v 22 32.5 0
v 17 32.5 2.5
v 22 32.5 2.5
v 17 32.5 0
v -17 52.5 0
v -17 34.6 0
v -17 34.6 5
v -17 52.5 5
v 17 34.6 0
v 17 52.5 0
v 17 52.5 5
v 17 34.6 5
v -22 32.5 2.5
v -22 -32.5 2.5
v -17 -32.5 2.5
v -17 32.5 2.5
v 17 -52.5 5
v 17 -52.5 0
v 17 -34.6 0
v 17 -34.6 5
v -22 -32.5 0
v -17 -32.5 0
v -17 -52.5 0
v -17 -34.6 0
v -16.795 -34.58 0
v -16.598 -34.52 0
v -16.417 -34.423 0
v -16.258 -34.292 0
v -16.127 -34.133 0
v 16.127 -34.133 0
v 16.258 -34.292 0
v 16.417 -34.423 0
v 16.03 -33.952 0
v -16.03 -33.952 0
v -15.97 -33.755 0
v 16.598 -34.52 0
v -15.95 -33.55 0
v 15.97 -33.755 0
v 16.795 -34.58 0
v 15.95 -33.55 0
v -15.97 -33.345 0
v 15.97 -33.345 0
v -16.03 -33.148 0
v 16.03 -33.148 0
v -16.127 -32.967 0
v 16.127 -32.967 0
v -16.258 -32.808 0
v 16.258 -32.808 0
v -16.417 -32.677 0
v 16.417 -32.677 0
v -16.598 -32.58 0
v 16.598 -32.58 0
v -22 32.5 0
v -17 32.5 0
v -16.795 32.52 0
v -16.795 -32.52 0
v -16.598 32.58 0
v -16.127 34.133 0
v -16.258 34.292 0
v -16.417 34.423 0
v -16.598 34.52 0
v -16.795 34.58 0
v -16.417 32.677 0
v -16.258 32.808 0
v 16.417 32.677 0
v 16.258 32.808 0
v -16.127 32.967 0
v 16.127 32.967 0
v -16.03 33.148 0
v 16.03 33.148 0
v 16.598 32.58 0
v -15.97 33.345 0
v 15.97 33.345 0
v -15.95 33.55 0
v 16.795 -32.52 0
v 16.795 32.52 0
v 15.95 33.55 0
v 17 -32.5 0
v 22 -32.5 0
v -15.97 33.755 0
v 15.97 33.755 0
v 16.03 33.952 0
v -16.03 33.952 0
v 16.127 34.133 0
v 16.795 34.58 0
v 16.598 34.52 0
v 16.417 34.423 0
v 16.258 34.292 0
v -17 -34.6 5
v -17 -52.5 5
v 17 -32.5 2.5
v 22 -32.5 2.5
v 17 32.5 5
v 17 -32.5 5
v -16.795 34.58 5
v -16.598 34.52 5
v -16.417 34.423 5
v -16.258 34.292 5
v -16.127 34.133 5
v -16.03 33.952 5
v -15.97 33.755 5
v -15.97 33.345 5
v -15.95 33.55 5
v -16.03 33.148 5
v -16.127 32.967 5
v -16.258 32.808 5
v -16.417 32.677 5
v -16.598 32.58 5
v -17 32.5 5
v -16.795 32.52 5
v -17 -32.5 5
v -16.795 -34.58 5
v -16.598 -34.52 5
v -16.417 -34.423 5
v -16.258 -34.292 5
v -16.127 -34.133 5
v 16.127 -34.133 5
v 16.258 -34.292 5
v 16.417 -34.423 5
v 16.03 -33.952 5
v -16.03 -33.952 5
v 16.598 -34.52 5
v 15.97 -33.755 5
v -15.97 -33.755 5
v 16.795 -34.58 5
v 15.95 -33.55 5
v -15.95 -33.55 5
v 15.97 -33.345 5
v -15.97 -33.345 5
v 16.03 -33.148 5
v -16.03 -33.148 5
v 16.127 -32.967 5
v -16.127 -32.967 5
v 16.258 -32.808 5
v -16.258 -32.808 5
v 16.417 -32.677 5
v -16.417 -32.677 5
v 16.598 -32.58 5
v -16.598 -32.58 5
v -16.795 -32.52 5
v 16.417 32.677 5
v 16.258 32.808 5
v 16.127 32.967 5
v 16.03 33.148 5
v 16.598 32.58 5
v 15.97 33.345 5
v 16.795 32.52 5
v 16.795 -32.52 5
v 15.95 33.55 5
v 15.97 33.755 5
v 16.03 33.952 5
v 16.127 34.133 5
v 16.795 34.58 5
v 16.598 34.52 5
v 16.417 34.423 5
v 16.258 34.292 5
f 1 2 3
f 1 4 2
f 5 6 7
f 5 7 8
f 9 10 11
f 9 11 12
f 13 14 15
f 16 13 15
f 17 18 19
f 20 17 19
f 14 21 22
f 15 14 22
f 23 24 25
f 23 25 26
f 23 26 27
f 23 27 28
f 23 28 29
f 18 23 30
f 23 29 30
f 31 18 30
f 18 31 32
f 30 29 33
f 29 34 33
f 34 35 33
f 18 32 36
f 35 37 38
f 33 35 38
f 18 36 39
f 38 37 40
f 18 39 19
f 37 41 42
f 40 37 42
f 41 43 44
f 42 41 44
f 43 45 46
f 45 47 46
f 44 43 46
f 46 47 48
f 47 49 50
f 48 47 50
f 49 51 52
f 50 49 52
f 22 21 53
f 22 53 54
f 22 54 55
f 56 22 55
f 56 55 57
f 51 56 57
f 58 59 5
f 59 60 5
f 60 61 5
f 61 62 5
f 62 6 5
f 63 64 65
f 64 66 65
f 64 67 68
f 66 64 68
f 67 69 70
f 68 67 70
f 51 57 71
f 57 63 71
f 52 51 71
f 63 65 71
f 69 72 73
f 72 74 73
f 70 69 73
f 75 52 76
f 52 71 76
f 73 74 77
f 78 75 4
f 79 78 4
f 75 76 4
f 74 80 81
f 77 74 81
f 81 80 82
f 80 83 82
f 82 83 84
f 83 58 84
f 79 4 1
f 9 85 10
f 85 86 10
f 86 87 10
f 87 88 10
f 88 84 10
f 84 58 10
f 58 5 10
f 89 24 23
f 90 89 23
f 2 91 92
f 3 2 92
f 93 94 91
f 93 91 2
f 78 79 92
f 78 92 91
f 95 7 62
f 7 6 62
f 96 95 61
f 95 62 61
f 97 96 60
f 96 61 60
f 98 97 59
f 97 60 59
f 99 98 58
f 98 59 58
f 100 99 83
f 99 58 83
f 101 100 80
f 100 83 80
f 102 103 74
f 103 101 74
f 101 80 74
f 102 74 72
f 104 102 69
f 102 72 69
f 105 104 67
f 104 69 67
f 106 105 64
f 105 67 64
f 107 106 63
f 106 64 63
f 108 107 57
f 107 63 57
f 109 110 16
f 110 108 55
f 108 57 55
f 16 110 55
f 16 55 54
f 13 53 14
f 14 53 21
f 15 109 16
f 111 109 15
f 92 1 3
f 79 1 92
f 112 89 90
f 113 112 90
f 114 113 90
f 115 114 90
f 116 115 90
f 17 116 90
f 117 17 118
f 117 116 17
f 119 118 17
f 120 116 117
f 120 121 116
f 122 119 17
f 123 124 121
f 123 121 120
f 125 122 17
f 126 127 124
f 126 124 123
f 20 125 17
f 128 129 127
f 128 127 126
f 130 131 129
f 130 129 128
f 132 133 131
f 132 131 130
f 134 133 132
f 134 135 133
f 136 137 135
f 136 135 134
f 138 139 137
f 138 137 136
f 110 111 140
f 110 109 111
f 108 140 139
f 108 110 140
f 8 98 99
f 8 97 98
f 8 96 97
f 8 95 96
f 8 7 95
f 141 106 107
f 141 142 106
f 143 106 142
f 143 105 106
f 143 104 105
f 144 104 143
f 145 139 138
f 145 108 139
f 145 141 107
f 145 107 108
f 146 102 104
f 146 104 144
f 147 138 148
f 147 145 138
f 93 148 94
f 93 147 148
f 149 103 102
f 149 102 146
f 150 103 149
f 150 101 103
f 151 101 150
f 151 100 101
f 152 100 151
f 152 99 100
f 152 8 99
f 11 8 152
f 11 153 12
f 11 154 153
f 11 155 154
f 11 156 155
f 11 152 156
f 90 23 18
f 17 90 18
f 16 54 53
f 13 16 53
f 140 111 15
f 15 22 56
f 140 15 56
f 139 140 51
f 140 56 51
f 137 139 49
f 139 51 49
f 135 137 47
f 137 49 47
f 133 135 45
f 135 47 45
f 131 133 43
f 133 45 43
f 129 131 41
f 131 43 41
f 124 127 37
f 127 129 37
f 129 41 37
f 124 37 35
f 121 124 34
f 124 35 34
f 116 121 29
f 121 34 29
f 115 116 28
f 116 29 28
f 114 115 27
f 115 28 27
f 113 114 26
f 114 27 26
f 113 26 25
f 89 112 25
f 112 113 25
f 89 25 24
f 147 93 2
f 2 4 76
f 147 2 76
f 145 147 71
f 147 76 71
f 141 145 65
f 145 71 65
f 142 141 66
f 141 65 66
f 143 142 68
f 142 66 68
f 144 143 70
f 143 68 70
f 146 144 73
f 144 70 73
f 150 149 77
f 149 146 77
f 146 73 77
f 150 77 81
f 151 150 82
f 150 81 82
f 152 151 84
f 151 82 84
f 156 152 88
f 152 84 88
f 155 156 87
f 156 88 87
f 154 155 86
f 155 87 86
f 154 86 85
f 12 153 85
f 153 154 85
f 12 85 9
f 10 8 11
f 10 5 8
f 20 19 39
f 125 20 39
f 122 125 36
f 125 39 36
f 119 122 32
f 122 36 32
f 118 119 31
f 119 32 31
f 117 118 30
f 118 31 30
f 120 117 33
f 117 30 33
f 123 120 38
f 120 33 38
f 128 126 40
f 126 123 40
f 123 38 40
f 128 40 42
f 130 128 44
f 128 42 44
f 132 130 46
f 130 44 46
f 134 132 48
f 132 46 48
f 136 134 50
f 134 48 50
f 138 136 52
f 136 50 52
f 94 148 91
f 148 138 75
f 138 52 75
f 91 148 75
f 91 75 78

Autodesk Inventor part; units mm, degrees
ref_plane "YZ Plane" through (0, 0, 0) normal (1, 0, 0) x (0, 1, 0)
ref_plane "XZ Plane" through (0, 0, 0) normal (0, 1, 0) x (-1, 0, 0)
ref_plane "XY Plane" through (0, 0, 0) normal (0, 0, 1) x (1, 0, 0)
sketch "スケッチ1" plane through (0, 0, 0) normal (0, 0, 1) x (1, 0, 0)
  line L0 (-17, -52.5) -> (17, -52.5) construction
  line L1 (17, -52.5) -> (17, 52.5) construction
  line L2 (17, 52.5) -> (-17, 52.5) construction
  line L3 (-17, 52.5) -> (-17, -52.5) construction
  line L4 (-17, -52.5) -> (17, 52.5) construction
  line L5 (17, -52.5) -> (-17, 52.5) construction
  line L6 (-17, 34.6) -> (-17, 52.5)
  line L7 (-17, 52.5) -> (17, 52.5)
  line L8 (17, 52.5) -> (17, 34.6)
  line L9 (-17, -34.6) -> (-17, -52.5)
  line L10 (-17, -52.5) -> (17, -52.5)
  line L11 (17, -52.5) -> (17, -34.6)
  line L12 (-17, 32.5) -> (-22, 32.5)
  line L13 (-22, 32.5) -> (-22, -32.5)
  line L14 (-22, -32.5) -> (-17, -32.5)
  line L15 (17, 32.5) -> (22, 32.5)
  line L16 (22, 32.5) -> (22, -32.5)
  line L17 (22, -32.5) -> (17, -32.5)
  arc A0 (-17, 32.5) -> (-17, 34.6) centre (-17, 33.55) ccw
  arc A1 (-17, -34.6) -> (-17, -32.5) centre (-17, -33.55) ccw
  arc A2 (17, 34.6) -> (17, 32.5) centre (17, 33.55) ccw
  arc A3 (17, -32.5) -> (17, -34.6) centre (17, -33.55) ccw
  line L18 (0, 0) -> (17, 0) construction
  line L19 (0, 0) -> (0, 52.5) construction
  line L20 (-12, 42.5) -> (12, 42.5) construction
  line L21 (12, 42.5) -> (12, -42.5) construction
  line L22 (12, -42.5) -> (-12, -42.5) construction
  line L23 (-12, -42.5) -> (-12, 42.5) construction
  circle A4 centre (-12, 42.5) radius 1.2
  circle A5 centre (12, 42.5) radius 1.2
  circle A6 centre (12, -42.5) radius 1.2
  circle A7 centre (-12, -42.5) radius 1.2
  point P0 (0, 42.5)
  point P1 (0, 0)
  dimension "d87" = 1.05
  dimension "d88" = 105
  dimension "d89" = 5
  dimension "d90" = 20
  dimension "d91" = 34
  dimension "d92" = 2.4
  dimension "d93" = 5
  dimension "d94" = 10
  dimension "d95" = 10
extrude "押し出し1" add sketch "スケッチ1" along normal blind 5
sketch "スケッチ2" plane through (0, 0, 5) normal (0, 0, 1) x (1, 0, 0)
  line L0 (-17, 52.5) -> (-17, 34.6) projected
  line L1 (17, 34.6) -> (17, 52.5) projected
  line L2 (-40.5884, 60.19) -> (-17, 60.19)
  line L3 (-17, 60.19) -> (-17, -101.7483)
  line L4 (-17, -101.7483) -> (-40.5884, -101.7483)
  line L5 (-40.5884, -101.7483) -> (-40.5884, 60.19)
  line L6 (53.5752, 90.4043) -> (17, 90.4043)
  line L7 (17, 90.4043) -> (17, -93.5321)
  line L8 (17, -93.5321) -> (53.5752, -93.5321)
  line L9 (53.5752, -93.5321) -> (53.5752, 90.4043)
  point P0 (0, 0)
extrude "押し出し2" cut sketch "スケッチ2" against normal blind 2.5
sketch "スケッチ4" plane through (0, 0, 5) normal (0, 0, 1) x (1, 0, 0)
  circle A0 centre (-12, -42.5) radius 1.2 projected
  circle A1 centre (-12, -42.5) radius 1.2
  circle A2 centre (12, -42.5) radius 1.2 projected
  circle A3 centre (12, -42.5) radius 1.2
  circle A4 centre (-12, 42.5) radius 1.2 projected
  circle A5 centre (-12, 42.5) radius 1.2
  circle A6 centre (12, 42.5) radius 1.2 projected
  circle A7 centre (12, 42.5) radius 1.2
  point P0 (0, 0)
extrude "押し出し4" add sketch "スケッチ4" against normal up to surface (5 mm away)
equation "\"d88\" = d83"
equation "\"d90\" = d84"
equation "\"d83\" = 105"
equation "\"d84\" = 20"
properties part number "コックピット_2_サブフレーム_5" material "アセタール樹脂、黒"
